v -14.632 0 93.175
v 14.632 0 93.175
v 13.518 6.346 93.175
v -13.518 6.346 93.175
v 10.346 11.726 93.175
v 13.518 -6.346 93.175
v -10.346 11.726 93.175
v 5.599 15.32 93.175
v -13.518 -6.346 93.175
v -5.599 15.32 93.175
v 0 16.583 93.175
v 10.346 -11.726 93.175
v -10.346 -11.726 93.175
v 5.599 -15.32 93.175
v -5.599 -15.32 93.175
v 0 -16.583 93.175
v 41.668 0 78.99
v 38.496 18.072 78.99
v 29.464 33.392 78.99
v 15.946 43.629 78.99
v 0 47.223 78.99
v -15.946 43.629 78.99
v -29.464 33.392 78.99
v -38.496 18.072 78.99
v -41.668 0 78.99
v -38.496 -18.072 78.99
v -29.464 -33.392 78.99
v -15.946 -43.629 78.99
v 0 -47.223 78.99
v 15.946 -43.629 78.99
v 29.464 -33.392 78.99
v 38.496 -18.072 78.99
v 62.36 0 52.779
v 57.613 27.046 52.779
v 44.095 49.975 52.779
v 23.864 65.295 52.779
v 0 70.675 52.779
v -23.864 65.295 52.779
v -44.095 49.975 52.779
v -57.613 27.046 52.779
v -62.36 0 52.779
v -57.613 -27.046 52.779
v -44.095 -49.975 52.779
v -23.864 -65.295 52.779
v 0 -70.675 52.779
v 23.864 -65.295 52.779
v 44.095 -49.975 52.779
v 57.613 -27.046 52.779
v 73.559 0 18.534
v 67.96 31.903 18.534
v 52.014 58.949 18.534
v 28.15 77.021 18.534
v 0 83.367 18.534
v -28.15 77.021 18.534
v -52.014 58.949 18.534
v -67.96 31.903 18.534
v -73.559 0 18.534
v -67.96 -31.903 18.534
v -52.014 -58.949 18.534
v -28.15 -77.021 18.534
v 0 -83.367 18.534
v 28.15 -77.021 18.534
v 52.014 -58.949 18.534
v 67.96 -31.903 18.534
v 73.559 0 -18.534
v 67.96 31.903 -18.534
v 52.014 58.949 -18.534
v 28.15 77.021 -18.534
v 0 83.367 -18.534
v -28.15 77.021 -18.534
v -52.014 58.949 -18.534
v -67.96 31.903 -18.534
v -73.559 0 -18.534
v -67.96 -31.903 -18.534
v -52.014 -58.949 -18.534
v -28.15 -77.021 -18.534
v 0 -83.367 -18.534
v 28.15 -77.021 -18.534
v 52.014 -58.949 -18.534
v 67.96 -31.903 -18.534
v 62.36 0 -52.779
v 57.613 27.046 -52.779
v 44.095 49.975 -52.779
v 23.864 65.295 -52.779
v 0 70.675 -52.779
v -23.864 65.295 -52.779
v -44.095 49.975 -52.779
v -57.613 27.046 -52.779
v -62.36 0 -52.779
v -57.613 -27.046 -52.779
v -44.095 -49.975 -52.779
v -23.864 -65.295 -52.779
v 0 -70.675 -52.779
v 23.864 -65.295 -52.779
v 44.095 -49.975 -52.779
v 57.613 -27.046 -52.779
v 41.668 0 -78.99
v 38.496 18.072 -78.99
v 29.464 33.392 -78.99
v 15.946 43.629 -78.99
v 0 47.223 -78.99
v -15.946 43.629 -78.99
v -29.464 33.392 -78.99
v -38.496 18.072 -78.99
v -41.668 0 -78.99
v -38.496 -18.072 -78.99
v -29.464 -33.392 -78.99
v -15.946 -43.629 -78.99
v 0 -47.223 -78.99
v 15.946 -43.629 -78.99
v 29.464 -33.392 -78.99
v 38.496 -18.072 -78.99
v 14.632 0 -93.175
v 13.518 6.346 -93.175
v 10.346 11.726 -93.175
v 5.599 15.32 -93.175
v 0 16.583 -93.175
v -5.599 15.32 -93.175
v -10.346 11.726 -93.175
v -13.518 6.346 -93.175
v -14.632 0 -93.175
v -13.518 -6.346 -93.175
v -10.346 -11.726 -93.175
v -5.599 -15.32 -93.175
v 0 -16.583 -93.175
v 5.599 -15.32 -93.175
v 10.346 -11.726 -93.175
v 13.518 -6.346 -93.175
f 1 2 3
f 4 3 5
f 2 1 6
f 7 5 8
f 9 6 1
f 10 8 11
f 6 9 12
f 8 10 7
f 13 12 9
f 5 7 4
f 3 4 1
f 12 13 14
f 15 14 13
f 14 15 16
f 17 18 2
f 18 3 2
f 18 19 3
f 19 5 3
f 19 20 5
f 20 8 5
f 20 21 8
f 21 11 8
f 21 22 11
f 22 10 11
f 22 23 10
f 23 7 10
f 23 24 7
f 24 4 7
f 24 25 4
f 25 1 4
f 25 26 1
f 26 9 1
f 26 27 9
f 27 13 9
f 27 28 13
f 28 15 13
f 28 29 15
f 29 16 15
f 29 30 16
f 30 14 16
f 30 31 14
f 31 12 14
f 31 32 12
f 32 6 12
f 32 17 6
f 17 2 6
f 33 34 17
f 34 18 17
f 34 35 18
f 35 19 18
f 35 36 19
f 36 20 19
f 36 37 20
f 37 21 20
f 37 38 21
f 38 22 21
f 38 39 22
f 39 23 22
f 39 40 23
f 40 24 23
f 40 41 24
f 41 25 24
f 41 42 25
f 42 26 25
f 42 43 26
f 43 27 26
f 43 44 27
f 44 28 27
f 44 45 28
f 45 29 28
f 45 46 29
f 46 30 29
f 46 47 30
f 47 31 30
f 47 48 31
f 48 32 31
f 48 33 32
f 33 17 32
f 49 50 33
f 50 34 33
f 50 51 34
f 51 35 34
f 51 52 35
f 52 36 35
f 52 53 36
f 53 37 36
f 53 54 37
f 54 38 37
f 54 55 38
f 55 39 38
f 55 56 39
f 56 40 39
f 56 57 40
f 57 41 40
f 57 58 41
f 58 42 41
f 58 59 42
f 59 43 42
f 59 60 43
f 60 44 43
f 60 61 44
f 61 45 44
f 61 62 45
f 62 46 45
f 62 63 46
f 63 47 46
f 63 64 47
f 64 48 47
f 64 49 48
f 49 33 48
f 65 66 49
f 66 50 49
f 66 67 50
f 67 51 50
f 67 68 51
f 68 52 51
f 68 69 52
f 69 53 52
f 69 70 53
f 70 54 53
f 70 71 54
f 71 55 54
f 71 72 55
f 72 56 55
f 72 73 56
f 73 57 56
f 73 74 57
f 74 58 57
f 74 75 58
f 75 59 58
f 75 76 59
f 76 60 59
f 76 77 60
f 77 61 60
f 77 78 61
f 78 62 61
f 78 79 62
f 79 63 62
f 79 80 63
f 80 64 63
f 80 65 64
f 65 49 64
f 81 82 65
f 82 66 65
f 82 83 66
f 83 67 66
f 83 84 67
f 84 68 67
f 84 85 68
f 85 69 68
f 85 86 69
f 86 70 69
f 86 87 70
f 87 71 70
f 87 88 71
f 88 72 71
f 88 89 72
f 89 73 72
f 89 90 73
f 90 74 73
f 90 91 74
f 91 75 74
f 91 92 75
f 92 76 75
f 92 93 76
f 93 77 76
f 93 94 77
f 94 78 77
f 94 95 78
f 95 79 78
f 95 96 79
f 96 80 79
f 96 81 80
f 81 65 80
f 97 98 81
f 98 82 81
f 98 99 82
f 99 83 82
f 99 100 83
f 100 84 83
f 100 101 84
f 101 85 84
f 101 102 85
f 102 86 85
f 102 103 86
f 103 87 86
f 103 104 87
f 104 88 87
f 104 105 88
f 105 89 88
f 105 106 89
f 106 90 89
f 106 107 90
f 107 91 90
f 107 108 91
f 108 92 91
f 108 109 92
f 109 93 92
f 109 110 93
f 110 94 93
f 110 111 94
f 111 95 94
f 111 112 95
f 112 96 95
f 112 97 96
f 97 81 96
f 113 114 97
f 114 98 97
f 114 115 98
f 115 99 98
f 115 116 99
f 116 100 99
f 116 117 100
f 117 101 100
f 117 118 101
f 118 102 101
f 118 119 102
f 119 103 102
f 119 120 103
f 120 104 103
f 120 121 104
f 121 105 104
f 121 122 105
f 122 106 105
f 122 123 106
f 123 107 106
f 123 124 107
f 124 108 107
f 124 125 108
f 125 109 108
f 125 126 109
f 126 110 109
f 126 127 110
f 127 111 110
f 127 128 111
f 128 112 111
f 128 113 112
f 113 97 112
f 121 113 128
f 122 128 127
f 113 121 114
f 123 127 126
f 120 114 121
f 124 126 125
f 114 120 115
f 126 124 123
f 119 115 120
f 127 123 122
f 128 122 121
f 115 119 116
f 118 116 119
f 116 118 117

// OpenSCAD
// Generated by SolidPython 1.0.1 on 2020-07-29 00:46:52


scale(v = [15, 17, 19]) {
	sphere(r = 5);
}
/***********************************************
*********      SolidPython code:      **********
************************************************
 
# import packages: SolidPython
from solid import *
from solid.utils import *
from itertools import chain, combinations, permutations


class Resize:

    def __init__(self, scad_file):
        self.scad_file = scad_file
        #self.scad_file = import_scad(scad_file)
        # cone/cylinder param:
        self.r1 = 0
        self.r2 = 0
        self.h = 0
        # rectangular prism param:
        self.w = 0
        self.l = 0
        # ellipse param:
        self.r = 0

    # import OpenScad code (file name corresponds to shape)


    # classify shape + parameters
    def assign(self, param1, param2, param3):
        if self.scad_file == 'cone.scad':
            self.r1 = param1
            self.r2 = param2
            self.h = param3
        elif self.scad_file == 'cylinder.scad':
            self.r1 = param1
            self.r2 = param2
            self.h = param3
        elif self.scad_file == 'rectangularPrism.scad':
            self.h = param1
            self.l = param2
            self.w = param3
        else:
            self.r = param1
            self.h = param2

    # resize parameters
    def iterate(self):
        x = range(3, 20, 2)
        i = 1
        if self.scad_file == 'cone.scad':
            tempList = list(permutations(x, 2))
            for temp in tempList:
                param1 = temp[0]
                param2 = temp[1]
                filepath = 'produced_scad_files/' + 'cone' + str(param1) + '_' + str(param2) + '_' + '.scad'
                scad_render_to_file(cylinder(h=param1, r1=param2, r2=0), filepath)

        elif self.scad_file == 'cylinder.scad':
            tempList = list(permutations(x, 3))
            for temp in tempList:
                param1 = temp[0]
                param2 = temp[1]
                filepath = 'produced_scad_files/' + 'cylinder' + str(param1) + '_' + str(param2) + '_' + '.scad'
                scad_render_to_file(cylinder(h=param1, r1=param2, r2=param2), filepath)

        elif self.scad_file == 'rectangularPrism.scad':
            tempList = list(permutations(x, 3))
            for temp in tempList:
                param1 = temp[0]
                param2 = temp[1]
                param3 = temp[2]
                filepath = 'produced_scad_files/' + 'rectangularPrism' + str(param1) + '_' + str(param2) + '_' + str(
                    param3) + '.scad'
                scad_render_to_file(cube(size=(param1, param2, param3)), filepath)

        elif self.scad_file == 'ellipse.scad':
            tempList = list(permutations(x, 4))
            for temp in tempList:
                param1 = temp[0]
                param2 = temp[1]
                param3 = temp[2]
                param4 = temp[3]
                filepath = 'produced_scad_files/' + 'ellipse' + str(param1) + '_' + str(param2) + '_' + str(param3) + '_' + str(param4) + '.scad'
                scad_render_to_file(scale([param1, param2, param3])(sphere(r=param4)), filepath)

    def render_to_scadfile(self):
        scad_render_to_file(scad, 'example.scad') 
 
************************************************/
